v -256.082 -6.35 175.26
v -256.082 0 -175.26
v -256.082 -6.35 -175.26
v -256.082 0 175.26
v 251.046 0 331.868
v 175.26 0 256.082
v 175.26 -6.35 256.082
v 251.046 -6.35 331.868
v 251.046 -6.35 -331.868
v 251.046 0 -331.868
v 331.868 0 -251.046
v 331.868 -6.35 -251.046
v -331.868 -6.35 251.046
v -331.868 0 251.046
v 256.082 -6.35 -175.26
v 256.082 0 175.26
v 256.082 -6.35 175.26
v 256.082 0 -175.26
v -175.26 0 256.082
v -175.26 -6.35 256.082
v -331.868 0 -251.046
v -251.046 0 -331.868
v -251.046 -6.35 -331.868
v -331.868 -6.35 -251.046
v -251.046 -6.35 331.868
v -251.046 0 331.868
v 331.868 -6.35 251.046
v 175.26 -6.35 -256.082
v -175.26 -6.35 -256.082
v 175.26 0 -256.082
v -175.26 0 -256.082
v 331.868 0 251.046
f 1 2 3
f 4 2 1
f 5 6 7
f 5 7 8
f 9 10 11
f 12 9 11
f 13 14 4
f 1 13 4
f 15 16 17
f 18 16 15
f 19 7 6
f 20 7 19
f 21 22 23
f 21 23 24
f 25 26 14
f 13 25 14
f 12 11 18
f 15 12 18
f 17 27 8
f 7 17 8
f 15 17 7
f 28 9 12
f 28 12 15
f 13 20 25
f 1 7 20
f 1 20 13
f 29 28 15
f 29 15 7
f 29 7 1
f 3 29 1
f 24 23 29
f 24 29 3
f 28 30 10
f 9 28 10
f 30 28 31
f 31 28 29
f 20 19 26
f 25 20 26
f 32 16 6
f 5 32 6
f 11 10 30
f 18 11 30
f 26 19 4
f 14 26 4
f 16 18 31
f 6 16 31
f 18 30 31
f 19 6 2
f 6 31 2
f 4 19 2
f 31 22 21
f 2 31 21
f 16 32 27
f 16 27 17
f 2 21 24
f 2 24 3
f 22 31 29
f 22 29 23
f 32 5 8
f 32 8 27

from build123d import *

# Parameters (mm, degrees)
BOSS_EXTRUDE1_DEPTH     = 6.35
CUT_EXTRUDE1_REACH      = 540.853
SKETCH3_R               = 48.260000044
MIRROR2_COPY_1_REACH    = 540.853
MIRROR2_COPY_1_SKETCH_R = 48.260000044
BOSS_EXTRUDE3_DEPTH     = 6.35
CUT_EXTRUDE12_DEPTH     = 55.372


with BuildPart() as part:
    # Sketch1 → Boss-Extrude1 (new body)
    with BuildSketch(Plane(origin=(0, 0, 0), x_dir=(1, 0, 0), z_dir=(0, 1, 0))):
        Polygon((254, -381), (-254, -381), (-381, -254), (-381, 254), (-254, 381), (254, 381), (381, 254), (381, -254), align=None)
    extrude(amount=-BOSS_EXTRUDE1_DEPTH)

    # Sketch3 → Cut-Extrude1 (cut, up to next)
    with BuildSketch(Plane(origin=(0, 0, 0), x_dir=(1, 0, 0), z_dir=(0, 1, 0)), mode=Mode.PRIVATE) as cut_extrude1_sk1:
        with BuildLine():
            Line((-175.260000044, -256.082305134), (-251.046104704, -331.868409794))
            Line((-251.046104704, -331.868409794), (-331.868409794, -251.046104704))
            Line((-331.868409794, -251.046104704), (-256.082305134, -175.260000044))
            Line((-256.082305134, -175.260000044), (-256.082305134, 0))
            Line((-256.082305134, 0), (-381, 0))
            Line((-381, 0), (-381, -254))
            Line((-381, -254), (-254, -381))
            Line((-254, -381), (0, -381))
            Line((0, -381), (0, -256.082305134))
            Line((0, -256.082305134), (-66.039999956, -256.082305134))
            Line((-66.039999956, -256.082305134), (-66.039999956, -279.4))
            ThreePointArc((-66.039999956, -279.4), (-120.65, -334.010000044), (-175.260000044, -279.4))
            Line((-175.260000044, -279.4), (-175.260000044, -256.082305134))
        make_face()
    cut_extrude1_tool1 = extrude(cut_extrude1_sk1.sketch, amount=-CUT_EXTRUDE1_REACH, mode=Mode.PRIVATE) & part.part
    # Sketch3 → Cut-Extrude1 (cut, up to next)
    with BuildSketch(Plane(origin=(0, 0, 0), x_dir=(1, 0, 0), z_dir=(0, 1, 0)), mode=Mode.PRIVATE) as cut_extrude1_sk2:
        with Locations(Location((-120.65, -279.4, 0), (0, 0, 270))):
            Circle(SKETCH3_R)
    cut_extrude1_tool2 = extrude(cut_extrude1_sk2.sketch, amount=-CUT_EXTRUDE1_REACH, mode=Mode.PRIVATE) & part.part
    cut_extrude1_1 = cut_extrude1_tool1.solids().sort_by_distance((-180.648154, 0, 267.741153))[0]
    add(cut_extrude1_1, mode=Mode.SUBTRACT)
    cut_extrude1_2 = cut_extrude1_tool2.solids().sort_by_distance((-120.65, 0, 279.4))[0]
    add(cut_extrude1_2, mode=Mode.SUBTRACT)
    cut_extrude1 = cut_extrude1_1 + cut_extrude1_2  # Cut-Extrude1 as one shape, for the pattern or mirror that repeats it

    # Mirror1: Cut-Extrude1 across plane
    add(cut_extrude1.mirror(Plane(origin=(0, 0, 0), x_dir=(0, 0, 1), z_dir=(1, 0, 0))), mode=Mode.SUBTRACT)

    # Mirror2: Cut-Extrude1 across plane
    add(cut_extrude1.mirror(Plane.XY), mode=Mode.SUBTRACT)

    # Mirror2 copy 1 sketch → Mirror2 copy 1 (cut, up to next)
    with BuildSketch(Plane(origin=(0, 0, 0), x_dir=(-1, 0, 0), z_dir=(0, 1, 0)), mode=Mode.PRIVATE) as mirror2_copy_1_sk1:
        with BuildLine():
            Line((-175.260000044, -256.082305134), (-251.046104704, -331.868409794))
            Line((-251.046104704, -331.868409794), (-331.868409794, -251.046104704))
            Line((-331.868409794, -251.046104704), (-256.082305134, -175.260000044))
            Line((-256.082305134, -175.260000044), (-256.082305134, 0))
            Line((-256.082305134, 0), (-381, 0))
            Line((-381, 0), (-381, -254))
            Line((-381, -254), (-254, -381))
            Line((-254, -381), (0, -381))
            Line((0, -381), (0, -256.082305134))
            Line((0, -256.082305134), (-66.039999956, -256.082305134))
            Line((-66.039999956, -256.082305134), (-66.039999956, -279.4))
            ThreePointArc((-66.039999956, -279.4), (-120.65, -334.010000044), (-175.260000044, -279.4))
            Line((-175.260000044, -279.4), (-175.260000044, -256.082305134))
        make_face()
    mirror2_copy_1_tool1 = extrude(mirror2_copy_1_sk1.sketch, amount=-MIRROR2_COPY_1_REACH, mode=Mode.PRIVATE) & part.part
    # Mirror2 copy 1 sketch → Mirror2 copy 1 (cut, up to next)
    with BuildSketch(Plane(origin=(0, 0, 0), x_dir=(-1, 0, 0), z_dir=(0, 1, 0)), mode=Mode.PRIVATE) as mirror2_copy_1_sk2:
        with Locations(Location((-120.65, -279.4, 0), (0, 0, 270))):
            Circle(MIRROR2_COPY_1_SKETCH_R)
    mirror2_copy_1_tool2 = extrude(mirror2_copy_1_sk2.sketch, amount=-MIRROR2_COPY_1_REACH, mode=Mode.PRIVATE) & part.part
    add(mirror2_copy_1_tool1.solids().sort_by_distance((180.648154, 0, -267.741153))[0], mode=Mode.SUBTRACT)
    add(mirror2_copy_1_tool2.solids().sort_by_distance((120.65, 0, -279.4))[0], mode=Mode.SUBTRACT)

    # Sketch39 → Boss-Extrude3 (add)
    with BuildSketch(Plane.XZ.offset(6.35)):
        with BuildLine():
            ThreePointArc((162.902960966, -256.082305134), (120.65, -231.139999956), (78.397039034, -256.082305134))
            Line((78.397039034, -256.082305134), (162.902960966, -256.082305134))
        make_face()
        with BuildLine():
            Line((-162.902960966, -256.082305134), (-78.397039034, -256.082305134))
            ThreePointArc((-78.397039034, -256.082305134), (-120.65, -231.139999956), (-162.902960966, -256.082305134))
        make_face()
    boss_extrude3 = extrude(amount=-BOSS_EXTRUDE3_DEPTH)

    # Sketch39_3 → Cut-Extrude12 (cut)
    with BuildSketch(Plane.XZ.offset(6.35)):
        with BuildLine():
            Line((78.397039034, -256.082305134), (66.039999956, -256.082305134))
            Line((66.039999956, -256.082305134), (66.039999956, -279.4))
            ThreePointArc((66.039999956, -279.4), (120.65, -334.010000044), (175.260000044, -279.4))
            Line((175.260000044, -279.4), (175.260000044, -256.082305134))
            Line((175.260000044, -256.082305134), (162.902960966, -256.082305134))
            ThreePointArc((162.902960966, -256.082305134), (167.384117635, -267.360487838), (168.910000044, -279.4))
            ThreePointArc((168.910000044, -279.4), (108.610487838, -326.134117635), (78.397039034, -256.082305134))
        make_face()
        with BuildLine():
            Line((-66.039999956, -279.4), (-66.039999956, -256.082305134))
            Line((-66.039999956, -256.082305134), (-78.397039034, -256.082305134))
            ThreePointArc((-78.397039034, -256.082305134), (-73.915882365, -267.360487838), (-72.389999956, -279.4))
            ThreePointArc((-72.389999956, -279.4), (-132.689512162, -326.134117635), (-162.902960966, -256.082305134))
            Line((-162.902960966, -256.082305134), (-175.260000044, -256.082305134))
            Line((-175.260000044, -256.082305134), (-175.260000044, -279.4))
            ThreePointArc((-175.260000044, -279.4), (-120.65, -334.010000044), (-66.039999956, -279.4))
        make_face()
    cut_extrude12 = extrude(amount=-CUT_EXTRUDE12_DEPTH, mode=Mode.SUBTRACT)

    # Mirror9: Boss-Extrude3, Cut-Extrude12 across plane
    add(boss_extrude3.mirror(Plane.XY))
    add(cut_extrude12.mirror(Plane.XY), mode=Mode.SUBTRACT)


solid = part.part
